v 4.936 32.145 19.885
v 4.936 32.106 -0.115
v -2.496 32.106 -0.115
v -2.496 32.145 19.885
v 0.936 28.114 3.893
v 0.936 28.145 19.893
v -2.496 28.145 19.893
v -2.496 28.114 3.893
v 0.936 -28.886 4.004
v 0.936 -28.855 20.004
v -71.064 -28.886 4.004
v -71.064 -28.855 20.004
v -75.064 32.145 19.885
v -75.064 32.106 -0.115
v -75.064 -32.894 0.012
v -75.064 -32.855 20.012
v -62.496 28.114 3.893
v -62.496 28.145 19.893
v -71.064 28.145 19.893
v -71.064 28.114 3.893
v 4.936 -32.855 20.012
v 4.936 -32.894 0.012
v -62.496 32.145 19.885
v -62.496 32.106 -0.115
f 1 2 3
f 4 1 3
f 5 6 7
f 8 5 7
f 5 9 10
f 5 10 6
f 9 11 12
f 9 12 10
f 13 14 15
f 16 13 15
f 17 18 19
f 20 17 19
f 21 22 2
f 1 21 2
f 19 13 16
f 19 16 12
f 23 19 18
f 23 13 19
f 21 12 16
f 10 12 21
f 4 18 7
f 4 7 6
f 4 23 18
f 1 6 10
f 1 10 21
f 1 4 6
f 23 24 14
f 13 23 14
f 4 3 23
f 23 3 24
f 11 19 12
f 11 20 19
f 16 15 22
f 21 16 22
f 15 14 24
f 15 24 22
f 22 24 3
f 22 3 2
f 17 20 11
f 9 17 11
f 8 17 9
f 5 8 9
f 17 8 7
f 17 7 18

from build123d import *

# Parameters (mm, degrees)
BOSS_EXTRUDE1_DEPTH = 20
SHELL2_T            = -4


with BuildPart() as part:
    # Sketch2 → Boss-Extrude1 (new body)
    with BuildSketch(Plane(origin=(-1e-09, -0.00010259, -0.052603991), x_dir=(1, 0, -1.2e-08), z_dir=(1.2e-08, 0.001950226, 0.999998098))):
        Polygon((-75.063999083, -32.893592991), (-67.504997012, -32.893592991), (4.936001691, -32.893592991), (4.936001691, 32.106283405), (-2.495998153, 32.10628351), (-62.495998239, 32.106284359), (-75.063999083, 32.106284359), align=None)
    extrude(amount=BOSS_EXTRUDE1_DEPTH)

    # Shell2
    shell2_openings = [part.faces().sort_by_distance(p)[0] for p in [
        (-40.55039837, 6.145223556, 19.93544972),
    ]]
    offset(amount=SHELL2_T, openings=shell2_openings, kind=Kind.INTERSECTION)


solid = part.part
